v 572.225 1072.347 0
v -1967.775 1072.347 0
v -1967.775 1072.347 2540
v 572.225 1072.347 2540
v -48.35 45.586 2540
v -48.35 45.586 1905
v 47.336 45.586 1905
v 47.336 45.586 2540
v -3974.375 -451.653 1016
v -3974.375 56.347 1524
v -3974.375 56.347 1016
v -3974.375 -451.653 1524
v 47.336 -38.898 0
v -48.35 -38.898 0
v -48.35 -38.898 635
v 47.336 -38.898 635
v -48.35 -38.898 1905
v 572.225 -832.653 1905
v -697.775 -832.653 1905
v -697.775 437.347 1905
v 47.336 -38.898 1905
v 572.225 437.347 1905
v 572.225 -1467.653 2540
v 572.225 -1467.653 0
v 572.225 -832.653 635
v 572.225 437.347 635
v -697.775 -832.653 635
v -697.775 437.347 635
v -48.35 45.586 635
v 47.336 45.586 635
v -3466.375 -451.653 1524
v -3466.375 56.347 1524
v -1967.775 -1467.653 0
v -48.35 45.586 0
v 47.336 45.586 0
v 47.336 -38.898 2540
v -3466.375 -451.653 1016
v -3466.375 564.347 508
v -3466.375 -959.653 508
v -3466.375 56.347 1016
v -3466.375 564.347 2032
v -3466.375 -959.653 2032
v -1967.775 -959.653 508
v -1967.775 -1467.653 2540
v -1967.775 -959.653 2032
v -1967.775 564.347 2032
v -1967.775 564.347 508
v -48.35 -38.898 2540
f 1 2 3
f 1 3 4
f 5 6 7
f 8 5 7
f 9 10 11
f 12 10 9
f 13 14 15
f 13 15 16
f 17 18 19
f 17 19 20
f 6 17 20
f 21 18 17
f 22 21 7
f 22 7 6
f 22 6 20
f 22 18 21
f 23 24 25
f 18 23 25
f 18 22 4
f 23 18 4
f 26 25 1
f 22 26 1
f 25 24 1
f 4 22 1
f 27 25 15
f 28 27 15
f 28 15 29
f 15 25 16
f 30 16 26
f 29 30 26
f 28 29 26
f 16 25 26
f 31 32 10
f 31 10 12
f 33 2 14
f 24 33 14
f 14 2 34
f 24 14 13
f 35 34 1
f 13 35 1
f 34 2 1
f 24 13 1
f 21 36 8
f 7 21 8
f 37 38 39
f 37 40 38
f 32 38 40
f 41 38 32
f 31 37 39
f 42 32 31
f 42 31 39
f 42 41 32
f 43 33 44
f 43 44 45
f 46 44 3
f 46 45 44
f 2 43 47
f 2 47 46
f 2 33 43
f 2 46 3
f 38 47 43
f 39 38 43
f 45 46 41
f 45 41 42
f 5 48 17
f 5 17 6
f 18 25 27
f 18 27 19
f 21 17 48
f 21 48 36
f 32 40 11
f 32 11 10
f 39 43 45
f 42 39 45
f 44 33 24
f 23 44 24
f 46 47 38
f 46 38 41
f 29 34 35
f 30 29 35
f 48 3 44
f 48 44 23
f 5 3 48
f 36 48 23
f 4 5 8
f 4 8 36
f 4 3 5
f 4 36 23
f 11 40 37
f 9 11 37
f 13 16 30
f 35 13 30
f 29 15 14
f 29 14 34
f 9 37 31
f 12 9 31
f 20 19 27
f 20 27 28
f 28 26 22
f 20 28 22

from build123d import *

# Parameters (mm, degrees)
F0_W     = 2540
F0_H     = 2540
F0_W_2   = 95.686204
F0_H_2   = 84.483918
F1_DEPTH = 2540
F2_W     = 1524
F2_H     = 1524
F3_DEPTH = 1498.6
F4_W     = 508
F4_H     = 508
F5_DEPTH = 508
F7_W     = 1270
F7_H     = 1270
F8_DEPTH = 1270


with BuildPart() as f1:
    # F0 (on Top) → F1 (new body)
    with BuildSketch(Plane.XY):
        with Locations((-697.775306, -197.653218)):
            Rectangle(F0_W, F0_H)
        with Locations((-0.506956, 3.34437)):
            Rectangle(F0_W_2, F0_H_2, mode=Mode.SUBTRACT)
    extrude(amount=F1_DEPTH)

    # F2 (on face) → F3 (join)
    with BuildSketch(Plane(origin=(-1967.775306, 0, 0), x_dir=(0, -1, 0), z_dir=(-1, 0, 0))):
        with Locations((197.653218, 1270)):
            Rectangle(F2_W, F2_H)
    extrude(amount=F3_DEPTH)

    # F4 (on face) → F5 (join)
    with BuildSketch(Plane(origin=(-3466.375306, 0, 0), x_dir=(0, -1, 0), z_dir=(-1, 0, 0))):
        with Locations((197.653218, 1270)):
            Rectangle(F4_W, F4_H)
    extrude(amount=F5_DEPTH)

    # F7 (on face) → F8 (cut)
    with BuildSketch(Plane.YZ.offset(572.224694)):
        with Locations((-197.653218, 1270)):
            Rectangle(F7_W, F7_H)
    extrude(amount=-F8_DEPTH, mode=Mode.SUBTRACT)


solid = f1.part
